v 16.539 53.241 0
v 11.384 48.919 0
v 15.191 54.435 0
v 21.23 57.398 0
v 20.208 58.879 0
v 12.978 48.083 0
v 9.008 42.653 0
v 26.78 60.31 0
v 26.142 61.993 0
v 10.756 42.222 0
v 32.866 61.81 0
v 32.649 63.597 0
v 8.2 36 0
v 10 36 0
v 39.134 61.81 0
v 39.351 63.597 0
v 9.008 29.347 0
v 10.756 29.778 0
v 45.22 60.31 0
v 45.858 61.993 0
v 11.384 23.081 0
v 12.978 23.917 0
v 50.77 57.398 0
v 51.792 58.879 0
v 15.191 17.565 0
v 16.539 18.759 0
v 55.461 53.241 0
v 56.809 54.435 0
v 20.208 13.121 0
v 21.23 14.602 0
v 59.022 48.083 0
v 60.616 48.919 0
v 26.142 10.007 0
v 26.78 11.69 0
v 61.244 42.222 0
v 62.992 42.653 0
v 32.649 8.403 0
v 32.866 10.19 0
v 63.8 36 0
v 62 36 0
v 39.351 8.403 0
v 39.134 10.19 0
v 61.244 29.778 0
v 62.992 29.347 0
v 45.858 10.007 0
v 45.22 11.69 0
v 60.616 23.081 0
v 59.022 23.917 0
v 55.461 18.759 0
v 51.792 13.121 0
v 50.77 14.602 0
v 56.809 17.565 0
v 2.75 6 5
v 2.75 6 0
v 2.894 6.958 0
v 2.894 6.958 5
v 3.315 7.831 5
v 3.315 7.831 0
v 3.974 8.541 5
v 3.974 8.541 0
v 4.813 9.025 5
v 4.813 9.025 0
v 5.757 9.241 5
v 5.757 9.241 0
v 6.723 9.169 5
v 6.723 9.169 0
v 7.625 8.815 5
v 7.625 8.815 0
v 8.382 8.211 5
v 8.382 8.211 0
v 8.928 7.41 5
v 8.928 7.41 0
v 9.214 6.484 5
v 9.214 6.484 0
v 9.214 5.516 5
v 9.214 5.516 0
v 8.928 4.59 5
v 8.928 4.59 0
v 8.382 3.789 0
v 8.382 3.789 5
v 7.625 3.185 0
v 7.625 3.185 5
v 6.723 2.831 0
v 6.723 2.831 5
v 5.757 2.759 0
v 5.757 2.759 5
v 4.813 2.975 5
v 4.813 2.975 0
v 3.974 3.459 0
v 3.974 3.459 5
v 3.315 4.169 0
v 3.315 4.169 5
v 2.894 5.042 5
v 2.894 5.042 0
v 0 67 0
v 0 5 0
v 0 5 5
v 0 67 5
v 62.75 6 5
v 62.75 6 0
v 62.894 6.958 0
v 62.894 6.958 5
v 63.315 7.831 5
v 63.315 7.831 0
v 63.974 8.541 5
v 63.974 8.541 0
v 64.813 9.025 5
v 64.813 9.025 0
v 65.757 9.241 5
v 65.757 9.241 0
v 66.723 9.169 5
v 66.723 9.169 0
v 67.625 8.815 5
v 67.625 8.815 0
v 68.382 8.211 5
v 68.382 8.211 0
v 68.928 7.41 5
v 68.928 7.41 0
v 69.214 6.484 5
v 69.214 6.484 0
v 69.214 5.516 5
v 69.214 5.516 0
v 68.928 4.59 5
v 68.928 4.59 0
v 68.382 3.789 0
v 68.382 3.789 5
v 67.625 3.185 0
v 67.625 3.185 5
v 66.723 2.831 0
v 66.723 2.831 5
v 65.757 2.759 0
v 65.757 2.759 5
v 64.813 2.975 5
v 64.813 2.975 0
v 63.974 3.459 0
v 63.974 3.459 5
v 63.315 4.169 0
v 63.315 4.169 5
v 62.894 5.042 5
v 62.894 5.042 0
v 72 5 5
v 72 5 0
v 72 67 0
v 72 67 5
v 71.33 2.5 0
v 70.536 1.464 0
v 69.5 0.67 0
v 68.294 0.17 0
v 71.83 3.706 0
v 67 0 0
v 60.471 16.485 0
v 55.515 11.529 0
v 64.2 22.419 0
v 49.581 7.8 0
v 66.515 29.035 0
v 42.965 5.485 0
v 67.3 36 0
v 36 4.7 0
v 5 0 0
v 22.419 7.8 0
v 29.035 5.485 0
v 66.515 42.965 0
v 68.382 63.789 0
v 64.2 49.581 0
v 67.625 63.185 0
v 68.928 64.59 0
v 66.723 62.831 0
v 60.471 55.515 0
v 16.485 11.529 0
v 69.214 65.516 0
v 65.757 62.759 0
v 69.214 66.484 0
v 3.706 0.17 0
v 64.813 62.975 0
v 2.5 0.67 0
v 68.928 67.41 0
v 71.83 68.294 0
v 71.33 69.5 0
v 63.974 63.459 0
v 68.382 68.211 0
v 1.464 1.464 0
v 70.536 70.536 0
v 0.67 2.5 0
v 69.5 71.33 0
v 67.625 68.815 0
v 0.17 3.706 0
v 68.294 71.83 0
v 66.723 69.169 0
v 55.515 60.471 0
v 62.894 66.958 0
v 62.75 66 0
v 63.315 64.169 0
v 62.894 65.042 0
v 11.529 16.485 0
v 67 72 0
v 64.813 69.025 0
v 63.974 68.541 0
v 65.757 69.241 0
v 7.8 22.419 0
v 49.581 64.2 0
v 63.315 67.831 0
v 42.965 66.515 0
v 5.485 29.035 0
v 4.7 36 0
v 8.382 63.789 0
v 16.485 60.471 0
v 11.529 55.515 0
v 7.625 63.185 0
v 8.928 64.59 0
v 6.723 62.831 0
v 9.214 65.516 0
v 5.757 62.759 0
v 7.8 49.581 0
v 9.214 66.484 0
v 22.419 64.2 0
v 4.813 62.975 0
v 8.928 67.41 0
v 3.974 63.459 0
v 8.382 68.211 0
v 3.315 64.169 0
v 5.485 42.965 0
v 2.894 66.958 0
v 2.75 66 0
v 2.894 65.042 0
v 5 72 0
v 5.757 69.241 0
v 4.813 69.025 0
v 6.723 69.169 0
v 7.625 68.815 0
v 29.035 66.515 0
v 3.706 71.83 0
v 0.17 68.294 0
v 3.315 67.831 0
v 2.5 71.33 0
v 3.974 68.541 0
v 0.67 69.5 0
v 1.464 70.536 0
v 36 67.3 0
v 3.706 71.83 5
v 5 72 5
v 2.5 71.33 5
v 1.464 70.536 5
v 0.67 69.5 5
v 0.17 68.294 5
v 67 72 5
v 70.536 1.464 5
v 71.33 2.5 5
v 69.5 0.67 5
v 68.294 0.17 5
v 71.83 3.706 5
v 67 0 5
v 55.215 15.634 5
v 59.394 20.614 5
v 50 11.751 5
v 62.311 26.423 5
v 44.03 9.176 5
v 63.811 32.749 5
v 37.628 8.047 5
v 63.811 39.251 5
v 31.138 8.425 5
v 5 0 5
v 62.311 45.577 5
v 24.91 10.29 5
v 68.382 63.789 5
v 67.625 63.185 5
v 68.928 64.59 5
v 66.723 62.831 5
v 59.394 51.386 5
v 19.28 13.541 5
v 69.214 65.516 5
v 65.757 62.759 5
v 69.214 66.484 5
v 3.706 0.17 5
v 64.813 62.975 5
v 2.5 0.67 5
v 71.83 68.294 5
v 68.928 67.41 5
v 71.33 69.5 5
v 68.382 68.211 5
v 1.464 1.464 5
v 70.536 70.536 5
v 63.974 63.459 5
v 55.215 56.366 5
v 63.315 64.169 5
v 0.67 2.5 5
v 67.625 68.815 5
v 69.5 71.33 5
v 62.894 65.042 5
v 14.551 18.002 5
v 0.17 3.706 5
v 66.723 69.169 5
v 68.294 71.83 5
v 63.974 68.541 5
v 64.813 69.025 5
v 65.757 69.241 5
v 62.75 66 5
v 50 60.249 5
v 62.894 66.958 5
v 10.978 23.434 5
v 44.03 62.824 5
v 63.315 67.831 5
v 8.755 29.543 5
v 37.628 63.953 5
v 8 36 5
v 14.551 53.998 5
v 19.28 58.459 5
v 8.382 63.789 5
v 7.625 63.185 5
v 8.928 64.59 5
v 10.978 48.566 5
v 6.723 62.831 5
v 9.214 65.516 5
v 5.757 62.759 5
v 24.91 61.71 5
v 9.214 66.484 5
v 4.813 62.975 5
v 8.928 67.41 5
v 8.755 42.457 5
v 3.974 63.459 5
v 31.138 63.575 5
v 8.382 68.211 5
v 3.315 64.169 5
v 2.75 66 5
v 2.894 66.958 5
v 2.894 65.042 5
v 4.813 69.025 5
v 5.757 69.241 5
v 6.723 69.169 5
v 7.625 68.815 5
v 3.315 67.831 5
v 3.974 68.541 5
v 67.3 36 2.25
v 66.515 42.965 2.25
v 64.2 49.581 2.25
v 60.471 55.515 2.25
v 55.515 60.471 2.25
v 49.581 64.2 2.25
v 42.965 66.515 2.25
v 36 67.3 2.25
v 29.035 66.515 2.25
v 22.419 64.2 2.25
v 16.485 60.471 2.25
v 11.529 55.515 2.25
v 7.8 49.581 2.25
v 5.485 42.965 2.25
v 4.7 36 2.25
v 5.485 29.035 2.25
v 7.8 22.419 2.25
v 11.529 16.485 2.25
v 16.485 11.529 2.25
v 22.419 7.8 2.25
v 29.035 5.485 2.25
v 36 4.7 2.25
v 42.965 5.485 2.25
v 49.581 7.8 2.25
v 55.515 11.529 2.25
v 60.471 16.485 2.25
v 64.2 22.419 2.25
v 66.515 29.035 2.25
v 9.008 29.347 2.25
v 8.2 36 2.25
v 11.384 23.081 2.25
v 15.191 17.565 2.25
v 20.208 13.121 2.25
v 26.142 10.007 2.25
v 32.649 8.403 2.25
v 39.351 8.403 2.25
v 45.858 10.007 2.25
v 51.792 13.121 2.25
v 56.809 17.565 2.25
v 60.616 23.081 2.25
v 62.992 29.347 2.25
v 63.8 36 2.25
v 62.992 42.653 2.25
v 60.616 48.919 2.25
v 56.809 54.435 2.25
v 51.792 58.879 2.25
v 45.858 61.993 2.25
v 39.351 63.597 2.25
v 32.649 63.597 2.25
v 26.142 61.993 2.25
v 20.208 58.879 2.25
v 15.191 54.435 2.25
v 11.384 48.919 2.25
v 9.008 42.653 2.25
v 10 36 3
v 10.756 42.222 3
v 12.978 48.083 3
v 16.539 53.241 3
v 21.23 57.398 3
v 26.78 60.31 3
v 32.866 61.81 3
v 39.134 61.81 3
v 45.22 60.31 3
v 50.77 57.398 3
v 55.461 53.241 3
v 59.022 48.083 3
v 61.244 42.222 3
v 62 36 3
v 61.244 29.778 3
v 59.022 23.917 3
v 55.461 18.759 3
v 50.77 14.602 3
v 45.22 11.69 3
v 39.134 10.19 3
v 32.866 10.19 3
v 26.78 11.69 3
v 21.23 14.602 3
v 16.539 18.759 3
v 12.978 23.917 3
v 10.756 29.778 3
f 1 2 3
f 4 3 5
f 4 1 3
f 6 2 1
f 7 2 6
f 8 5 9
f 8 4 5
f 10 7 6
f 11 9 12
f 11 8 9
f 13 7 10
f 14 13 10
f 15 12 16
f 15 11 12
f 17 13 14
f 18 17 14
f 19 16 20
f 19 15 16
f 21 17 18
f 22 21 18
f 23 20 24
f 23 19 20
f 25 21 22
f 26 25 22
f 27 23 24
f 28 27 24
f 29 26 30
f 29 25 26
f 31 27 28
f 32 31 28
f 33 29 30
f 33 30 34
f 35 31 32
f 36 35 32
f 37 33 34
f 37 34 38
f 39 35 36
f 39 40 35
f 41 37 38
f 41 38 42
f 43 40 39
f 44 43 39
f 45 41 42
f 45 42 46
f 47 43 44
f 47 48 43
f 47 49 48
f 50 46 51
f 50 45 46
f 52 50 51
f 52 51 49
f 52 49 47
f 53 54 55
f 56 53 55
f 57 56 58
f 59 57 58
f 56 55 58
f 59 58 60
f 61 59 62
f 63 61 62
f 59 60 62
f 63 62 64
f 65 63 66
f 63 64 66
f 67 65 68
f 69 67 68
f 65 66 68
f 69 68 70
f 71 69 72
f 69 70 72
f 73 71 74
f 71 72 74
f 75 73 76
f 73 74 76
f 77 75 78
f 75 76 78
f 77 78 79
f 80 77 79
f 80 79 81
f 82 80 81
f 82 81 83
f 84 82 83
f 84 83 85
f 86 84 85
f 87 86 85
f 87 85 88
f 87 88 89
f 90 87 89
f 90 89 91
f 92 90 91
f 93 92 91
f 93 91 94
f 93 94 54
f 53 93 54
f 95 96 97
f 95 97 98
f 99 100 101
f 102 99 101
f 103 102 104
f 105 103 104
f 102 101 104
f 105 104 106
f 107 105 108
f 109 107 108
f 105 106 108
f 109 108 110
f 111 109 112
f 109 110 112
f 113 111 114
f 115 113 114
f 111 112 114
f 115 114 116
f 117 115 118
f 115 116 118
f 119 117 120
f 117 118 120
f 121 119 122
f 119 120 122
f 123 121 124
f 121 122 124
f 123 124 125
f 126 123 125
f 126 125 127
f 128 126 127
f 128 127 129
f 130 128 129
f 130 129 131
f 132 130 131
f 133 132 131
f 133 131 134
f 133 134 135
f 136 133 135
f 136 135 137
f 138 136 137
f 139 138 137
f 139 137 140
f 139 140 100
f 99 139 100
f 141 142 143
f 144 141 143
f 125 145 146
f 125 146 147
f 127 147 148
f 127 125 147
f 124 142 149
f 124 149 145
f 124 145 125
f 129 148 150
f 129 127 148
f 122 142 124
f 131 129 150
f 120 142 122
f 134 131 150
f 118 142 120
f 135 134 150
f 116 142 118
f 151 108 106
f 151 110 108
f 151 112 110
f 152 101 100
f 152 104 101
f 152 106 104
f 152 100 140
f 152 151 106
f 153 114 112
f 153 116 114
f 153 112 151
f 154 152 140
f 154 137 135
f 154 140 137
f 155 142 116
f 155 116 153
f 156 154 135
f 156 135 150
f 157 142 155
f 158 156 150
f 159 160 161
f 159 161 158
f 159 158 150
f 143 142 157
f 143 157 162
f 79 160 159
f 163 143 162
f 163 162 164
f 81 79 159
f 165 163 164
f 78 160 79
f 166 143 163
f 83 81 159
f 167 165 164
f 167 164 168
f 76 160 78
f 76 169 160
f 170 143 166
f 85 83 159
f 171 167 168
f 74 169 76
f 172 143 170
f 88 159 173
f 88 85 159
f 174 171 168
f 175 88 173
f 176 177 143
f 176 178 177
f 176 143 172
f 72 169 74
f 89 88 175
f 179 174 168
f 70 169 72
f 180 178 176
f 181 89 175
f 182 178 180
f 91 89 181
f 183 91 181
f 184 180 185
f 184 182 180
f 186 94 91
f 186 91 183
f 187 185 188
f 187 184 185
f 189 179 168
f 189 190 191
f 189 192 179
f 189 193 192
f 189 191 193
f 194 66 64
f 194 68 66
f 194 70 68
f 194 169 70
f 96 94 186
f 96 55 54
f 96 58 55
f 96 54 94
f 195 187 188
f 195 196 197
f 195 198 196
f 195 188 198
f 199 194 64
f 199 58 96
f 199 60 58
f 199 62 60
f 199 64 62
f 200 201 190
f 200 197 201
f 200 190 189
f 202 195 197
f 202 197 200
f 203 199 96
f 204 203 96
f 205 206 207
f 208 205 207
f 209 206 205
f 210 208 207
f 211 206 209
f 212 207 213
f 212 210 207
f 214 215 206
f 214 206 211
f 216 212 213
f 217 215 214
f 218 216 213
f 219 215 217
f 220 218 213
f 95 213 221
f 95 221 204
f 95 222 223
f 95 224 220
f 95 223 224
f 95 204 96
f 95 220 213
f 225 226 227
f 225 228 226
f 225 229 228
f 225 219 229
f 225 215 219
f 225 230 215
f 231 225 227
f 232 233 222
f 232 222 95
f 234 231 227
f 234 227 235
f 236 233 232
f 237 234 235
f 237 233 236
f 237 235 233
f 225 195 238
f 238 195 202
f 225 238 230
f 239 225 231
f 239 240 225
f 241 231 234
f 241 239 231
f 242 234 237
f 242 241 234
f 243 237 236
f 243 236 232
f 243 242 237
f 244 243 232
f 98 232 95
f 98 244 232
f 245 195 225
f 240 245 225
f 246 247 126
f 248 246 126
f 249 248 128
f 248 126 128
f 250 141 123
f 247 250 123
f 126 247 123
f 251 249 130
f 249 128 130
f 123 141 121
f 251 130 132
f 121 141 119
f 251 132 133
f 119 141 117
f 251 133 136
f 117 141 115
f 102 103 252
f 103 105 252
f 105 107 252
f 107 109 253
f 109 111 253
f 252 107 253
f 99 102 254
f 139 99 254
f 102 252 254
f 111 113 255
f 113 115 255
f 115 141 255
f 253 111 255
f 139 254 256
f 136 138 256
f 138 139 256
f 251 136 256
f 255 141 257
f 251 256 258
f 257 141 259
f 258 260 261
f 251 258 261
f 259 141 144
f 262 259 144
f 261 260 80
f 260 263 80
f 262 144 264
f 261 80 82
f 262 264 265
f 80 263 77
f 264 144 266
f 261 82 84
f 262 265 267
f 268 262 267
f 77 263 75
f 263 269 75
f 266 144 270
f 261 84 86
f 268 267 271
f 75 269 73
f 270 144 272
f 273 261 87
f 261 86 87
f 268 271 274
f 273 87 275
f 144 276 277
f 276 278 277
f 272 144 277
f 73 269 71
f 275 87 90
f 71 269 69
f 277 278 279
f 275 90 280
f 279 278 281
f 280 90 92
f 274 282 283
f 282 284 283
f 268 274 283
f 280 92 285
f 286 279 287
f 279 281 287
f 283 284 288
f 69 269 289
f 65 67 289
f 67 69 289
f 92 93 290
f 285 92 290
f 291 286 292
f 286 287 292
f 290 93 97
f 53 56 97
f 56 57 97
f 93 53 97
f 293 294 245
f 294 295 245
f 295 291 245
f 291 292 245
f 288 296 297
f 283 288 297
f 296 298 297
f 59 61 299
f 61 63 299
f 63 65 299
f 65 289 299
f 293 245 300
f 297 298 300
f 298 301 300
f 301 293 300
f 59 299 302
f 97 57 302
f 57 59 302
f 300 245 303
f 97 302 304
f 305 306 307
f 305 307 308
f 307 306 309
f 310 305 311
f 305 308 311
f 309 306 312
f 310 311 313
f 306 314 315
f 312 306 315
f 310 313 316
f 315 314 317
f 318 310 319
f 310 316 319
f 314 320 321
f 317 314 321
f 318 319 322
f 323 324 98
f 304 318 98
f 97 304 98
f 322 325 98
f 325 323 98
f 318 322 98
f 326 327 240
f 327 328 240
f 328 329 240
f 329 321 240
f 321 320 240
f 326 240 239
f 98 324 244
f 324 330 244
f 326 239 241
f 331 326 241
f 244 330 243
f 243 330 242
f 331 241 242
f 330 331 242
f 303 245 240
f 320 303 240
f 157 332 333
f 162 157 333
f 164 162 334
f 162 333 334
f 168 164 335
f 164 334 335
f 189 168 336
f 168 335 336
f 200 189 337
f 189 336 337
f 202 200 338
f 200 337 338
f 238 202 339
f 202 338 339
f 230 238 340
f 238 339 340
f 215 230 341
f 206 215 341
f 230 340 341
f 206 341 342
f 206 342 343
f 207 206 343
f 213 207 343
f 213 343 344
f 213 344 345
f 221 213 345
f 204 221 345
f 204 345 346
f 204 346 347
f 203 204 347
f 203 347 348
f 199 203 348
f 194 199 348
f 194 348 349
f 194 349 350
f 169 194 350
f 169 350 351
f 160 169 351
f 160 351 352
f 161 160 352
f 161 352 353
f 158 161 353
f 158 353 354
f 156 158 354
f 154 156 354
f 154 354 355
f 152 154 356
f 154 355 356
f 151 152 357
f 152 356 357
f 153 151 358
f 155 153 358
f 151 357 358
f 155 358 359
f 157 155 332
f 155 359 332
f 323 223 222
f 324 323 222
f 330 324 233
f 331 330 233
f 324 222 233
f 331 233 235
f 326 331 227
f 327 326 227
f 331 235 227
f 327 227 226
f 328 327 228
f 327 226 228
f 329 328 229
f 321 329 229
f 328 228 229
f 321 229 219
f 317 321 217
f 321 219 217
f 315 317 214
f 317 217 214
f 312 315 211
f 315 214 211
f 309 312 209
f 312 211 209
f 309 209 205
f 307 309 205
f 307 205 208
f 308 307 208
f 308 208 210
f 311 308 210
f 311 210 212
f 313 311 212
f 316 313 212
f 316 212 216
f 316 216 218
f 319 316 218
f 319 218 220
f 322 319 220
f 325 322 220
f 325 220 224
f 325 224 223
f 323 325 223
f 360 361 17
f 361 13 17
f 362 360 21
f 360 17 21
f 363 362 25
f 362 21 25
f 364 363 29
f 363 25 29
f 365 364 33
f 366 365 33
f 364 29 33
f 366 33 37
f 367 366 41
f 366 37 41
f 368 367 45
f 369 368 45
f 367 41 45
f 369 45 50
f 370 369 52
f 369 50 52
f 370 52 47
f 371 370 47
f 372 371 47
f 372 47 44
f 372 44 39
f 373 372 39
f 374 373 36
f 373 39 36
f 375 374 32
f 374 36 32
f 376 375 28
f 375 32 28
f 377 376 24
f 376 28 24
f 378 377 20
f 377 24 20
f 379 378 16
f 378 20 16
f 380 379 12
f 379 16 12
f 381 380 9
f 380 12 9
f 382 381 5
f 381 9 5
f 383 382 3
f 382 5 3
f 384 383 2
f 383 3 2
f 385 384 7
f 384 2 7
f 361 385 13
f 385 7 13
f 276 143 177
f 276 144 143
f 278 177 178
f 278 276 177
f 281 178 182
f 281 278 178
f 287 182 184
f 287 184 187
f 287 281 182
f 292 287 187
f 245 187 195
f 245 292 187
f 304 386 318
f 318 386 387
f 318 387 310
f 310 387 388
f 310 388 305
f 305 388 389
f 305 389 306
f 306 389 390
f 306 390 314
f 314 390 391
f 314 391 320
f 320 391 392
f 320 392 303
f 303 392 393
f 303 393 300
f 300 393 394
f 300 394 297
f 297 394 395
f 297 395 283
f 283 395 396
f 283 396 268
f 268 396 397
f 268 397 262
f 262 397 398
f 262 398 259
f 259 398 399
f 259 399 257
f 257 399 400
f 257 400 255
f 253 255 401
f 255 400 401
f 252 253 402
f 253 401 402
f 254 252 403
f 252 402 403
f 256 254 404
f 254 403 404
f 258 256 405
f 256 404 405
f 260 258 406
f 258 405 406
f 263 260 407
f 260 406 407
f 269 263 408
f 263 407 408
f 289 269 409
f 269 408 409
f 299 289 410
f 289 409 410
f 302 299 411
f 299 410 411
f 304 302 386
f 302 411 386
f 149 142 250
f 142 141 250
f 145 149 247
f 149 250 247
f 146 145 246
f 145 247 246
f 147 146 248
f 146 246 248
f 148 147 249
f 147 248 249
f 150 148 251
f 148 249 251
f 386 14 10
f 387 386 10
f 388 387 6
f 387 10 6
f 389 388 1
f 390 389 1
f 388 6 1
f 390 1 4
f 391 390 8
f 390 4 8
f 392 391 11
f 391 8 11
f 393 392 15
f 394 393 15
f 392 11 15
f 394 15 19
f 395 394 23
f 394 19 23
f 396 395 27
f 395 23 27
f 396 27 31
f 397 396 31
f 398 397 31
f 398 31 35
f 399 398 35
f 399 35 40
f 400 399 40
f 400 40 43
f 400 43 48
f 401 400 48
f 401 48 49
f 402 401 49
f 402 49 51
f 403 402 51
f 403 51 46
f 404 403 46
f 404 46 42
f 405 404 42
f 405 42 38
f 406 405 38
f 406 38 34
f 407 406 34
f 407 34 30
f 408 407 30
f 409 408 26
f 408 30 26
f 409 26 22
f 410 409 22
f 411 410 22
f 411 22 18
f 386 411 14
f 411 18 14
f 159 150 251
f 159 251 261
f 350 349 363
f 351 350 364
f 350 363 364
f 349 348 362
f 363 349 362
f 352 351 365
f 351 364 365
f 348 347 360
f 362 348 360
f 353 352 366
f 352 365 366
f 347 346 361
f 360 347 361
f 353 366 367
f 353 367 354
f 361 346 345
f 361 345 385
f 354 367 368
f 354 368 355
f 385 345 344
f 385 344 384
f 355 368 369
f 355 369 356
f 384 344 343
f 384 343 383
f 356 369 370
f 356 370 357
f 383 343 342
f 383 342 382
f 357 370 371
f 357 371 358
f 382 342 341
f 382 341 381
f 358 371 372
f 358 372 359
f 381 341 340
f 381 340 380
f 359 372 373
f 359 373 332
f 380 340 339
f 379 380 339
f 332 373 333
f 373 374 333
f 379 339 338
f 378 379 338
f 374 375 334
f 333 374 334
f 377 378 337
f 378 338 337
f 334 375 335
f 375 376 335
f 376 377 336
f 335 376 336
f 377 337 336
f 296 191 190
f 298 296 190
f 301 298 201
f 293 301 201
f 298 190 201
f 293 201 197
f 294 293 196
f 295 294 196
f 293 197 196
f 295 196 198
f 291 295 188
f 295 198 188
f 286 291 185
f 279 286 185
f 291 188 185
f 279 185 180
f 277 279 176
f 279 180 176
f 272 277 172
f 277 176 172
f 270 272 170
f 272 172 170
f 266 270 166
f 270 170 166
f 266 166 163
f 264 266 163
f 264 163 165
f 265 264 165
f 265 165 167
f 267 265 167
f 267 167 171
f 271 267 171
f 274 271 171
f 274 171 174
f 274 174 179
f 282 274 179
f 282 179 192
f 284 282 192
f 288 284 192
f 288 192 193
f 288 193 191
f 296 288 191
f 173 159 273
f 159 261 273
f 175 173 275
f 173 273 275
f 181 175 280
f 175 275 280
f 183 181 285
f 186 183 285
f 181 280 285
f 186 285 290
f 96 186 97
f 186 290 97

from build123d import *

# Parameters (mm, degrees)
SKETCH1_W           = 72
SKETCH1_H           = 72
BOSS_EXTRUDE1_DEPTH = 5
HOLE1_D             = 62.6
HOLE1_DEPTH         = 2.25
SKETCH4_W           = 27.8
SKETCH4_H           = 2.25
HOLE2_D             = 6.5
HOLE3_D             = 52
CHAMFER1_SIZE       = 2
FILLET1_R           = 5


with BuildPart() as part:
    # Sketch1 → Boss-Extrude1 (new body)
    with BuildSketch(Plane(origin=(0, 0, 0), x_dir=(-1, 0, 0), z_dir=(0, 0, -1))):
        with Locations((-36, 36)):
            Rectangle(SKETCH1_W, SKETCH1_H)
    extrude(amount=-BOSS_EXTRUDE1_DEPTH)

    # Hole1
    with Locations(Plane(origin=(0, 0, 0), x_dir=(-1, 0, 0), z_dir=(0, 0, -1))):
        with Locations((-36, 36)):
            Hole(HOLE1_D / 2, depth=HOLE1_DEPTH)

    # Sketch4 → Revolve1 (revolve)
    with BuildSketch(Plane(origin=(0, 36, 0), x_dir=(1, 0, 0), z_dir=(0, 1, 0)), mode=Mode.PRIVATE) as revolve1_sk:
        with Locations((49.9, -1.125)):
            Rectangle(SKETCH4_W, SKETCH4_H)
    revolve(revolve1_sk.sketch.rotate(Axis((36, 36, 0), (0, 0, 1)), 180), axis=Axis((36, 36, 0), (0, 0, 1)))

    # Hole2 (through all)
    with Locations(Plane.XY.offset(5)):
        with Locations((66, 6), (6, 6), (6, 66), (66, 66)):
            Hole(HOLE2_D / 2)

    # Hole3 (through all)
    with Locations(Plane.XY.offset(5)):
        with Locations((36, 36)):
            Hole(HOLE3_D / 2)

    # Chamfer1
    chamfer1_edges = [part.edges().sort_by_distance(p)[0] for p in [
        (62, 36, 5),
    ]]
    chamfer(chamfer1_edges, length=CHAMFER1_SIZE)

    # Fillet1
    fillet1_edges = [part.edges().sort_by_distance(p)[0] for p in [
        (72, 0, 2.5),
        (72, 72, 2.5),
        (0, 72, 2.5),
        (0, 0, 2.5),
    ]]
    fillet(fillet1_edges, radius=FILLET1_R)


solid = part.part
